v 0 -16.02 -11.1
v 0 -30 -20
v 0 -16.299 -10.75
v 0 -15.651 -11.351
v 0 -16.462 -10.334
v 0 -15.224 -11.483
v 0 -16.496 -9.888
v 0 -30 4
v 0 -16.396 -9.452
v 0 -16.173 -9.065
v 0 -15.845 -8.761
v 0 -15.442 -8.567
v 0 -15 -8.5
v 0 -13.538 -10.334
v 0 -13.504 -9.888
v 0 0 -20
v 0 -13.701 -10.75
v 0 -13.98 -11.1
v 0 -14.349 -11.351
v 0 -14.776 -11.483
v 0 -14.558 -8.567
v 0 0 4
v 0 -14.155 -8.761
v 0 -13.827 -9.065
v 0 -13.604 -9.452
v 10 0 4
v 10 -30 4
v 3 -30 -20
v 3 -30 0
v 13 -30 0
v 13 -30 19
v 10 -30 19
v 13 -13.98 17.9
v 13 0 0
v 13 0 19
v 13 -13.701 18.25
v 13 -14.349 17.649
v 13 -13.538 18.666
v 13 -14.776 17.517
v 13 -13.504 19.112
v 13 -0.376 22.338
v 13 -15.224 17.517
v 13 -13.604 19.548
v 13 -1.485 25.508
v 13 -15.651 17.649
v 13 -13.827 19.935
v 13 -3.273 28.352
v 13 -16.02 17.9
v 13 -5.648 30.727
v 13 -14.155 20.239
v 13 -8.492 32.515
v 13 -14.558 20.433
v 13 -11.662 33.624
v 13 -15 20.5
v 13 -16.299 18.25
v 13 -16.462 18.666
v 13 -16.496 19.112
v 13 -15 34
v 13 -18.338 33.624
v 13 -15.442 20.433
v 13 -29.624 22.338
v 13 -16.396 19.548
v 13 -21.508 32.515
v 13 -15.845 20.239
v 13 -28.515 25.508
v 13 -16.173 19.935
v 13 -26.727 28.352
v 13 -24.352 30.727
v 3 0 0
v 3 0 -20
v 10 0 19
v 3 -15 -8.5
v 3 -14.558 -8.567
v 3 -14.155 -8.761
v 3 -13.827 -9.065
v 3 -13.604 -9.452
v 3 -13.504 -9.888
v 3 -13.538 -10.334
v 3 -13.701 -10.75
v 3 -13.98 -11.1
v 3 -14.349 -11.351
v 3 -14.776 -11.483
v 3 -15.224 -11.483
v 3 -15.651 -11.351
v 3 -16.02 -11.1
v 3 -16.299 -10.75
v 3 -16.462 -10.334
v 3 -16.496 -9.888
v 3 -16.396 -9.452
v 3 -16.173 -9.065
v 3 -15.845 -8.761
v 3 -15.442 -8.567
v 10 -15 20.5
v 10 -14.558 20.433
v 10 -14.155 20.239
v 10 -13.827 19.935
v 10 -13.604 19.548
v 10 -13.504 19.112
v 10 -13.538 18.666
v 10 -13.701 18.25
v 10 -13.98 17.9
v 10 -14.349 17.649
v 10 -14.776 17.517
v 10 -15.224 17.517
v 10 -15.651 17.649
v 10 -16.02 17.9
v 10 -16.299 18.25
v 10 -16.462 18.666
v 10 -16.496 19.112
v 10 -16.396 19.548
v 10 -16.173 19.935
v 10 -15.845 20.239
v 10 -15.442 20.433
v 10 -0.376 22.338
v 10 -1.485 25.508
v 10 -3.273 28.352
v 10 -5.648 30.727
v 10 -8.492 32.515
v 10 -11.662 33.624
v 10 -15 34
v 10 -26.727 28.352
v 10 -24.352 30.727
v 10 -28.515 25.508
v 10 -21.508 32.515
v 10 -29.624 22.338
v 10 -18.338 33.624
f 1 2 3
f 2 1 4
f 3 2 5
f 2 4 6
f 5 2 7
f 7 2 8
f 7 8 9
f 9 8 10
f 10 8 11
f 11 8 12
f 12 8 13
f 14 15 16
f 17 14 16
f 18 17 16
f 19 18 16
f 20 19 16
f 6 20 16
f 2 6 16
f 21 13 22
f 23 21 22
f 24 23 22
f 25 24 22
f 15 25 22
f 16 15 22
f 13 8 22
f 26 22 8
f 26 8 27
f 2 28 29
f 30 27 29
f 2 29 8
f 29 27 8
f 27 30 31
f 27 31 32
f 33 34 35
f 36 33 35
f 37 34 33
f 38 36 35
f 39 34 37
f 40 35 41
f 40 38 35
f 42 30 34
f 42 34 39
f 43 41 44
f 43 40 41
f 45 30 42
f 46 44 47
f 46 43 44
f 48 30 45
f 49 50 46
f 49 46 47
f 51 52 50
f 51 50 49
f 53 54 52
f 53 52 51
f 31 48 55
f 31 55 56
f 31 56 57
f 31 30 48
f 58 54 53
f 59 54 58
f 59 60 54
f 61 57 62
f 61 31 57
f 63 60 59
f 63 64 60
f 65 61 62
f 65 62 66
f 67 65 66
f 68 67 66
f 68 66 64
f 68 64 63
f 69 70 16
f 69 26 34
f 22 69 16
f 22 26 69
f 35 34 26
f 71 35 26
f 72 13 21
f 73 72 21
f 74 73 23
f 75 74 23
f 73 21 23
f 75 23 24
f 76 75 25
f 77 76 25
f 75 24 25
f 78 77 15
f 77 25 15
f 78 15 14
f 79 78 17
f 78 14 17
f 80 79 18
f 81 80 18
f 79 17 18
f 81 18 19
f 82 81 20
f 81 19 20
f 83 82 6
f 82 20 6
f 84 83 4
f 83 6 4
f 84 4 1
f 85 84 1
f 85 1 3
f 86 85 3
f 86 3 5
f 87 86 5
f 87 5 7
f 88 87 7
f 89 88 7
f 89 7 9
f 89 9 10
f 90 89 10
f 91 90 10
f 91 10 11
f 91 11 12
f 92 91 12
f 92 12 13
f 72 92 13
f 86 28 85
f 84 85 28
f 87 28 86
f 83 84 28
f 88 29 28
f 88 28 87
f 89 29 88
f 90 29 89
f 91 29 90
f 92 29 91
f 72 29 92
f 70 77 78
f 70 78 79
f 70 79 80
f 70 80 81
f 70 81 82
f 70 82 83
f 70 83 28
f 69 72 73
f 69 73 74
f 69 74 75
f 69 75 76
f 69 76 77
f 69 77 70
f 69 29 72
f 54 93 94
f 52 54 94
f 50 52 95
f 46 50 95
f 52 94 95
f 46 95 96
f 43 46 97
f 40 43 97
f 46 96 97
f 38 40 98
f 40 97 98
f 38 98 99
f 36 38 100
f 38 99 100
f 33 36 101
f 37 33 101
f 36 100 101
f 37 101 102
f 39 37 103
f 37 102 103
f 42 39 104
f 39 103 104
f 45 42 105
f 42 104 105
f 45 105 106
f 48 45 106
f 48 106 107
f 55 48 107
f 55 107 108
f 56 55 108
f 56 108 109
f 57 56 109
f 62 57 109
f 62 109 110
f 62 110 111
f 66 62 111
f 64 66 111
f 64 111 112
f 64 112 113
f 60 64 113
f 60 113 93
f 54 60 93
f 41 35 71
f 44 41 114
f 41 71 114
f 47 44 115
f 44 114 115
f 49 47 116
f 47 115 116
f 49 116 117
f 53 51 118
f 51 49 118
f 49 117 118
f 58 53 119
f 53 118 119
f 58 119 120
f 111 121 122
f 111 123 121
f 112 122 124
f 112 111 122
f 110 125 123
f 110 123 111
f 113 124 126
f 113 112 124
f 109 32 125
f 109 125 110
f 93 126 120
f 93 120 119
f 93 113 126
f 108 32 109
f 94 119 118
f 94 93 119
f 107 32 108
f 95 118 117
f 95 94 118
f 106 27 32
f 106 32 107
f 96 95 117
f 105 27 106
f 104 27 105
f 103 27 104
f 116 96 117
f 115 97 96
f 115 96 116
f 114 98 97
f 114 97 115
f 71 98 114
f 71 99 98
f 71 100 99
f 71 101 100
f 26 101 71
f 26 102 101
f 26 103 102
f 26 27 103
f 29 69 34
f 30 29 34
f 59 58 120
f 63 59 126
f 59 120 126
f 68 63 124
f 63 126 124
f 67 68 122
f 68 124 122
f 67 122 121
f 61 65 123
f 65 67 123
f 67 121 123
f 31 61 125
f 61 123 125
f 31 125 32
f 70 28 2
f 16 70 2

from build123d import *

# Parameters (mm, degrees)
SKETCH_1_W          = 81
SKETCH_1_H          = 30
EXTRUDE_1_DEPTH     = 4
SKETCH_2_W          = 3
SKETCH_2_H          = 30
EXTRUDE_2_DEPTH     = 20
CUT_EXTRUDE_1_REACH = 90.662
SKETCH_3_R          = 1.5
SKETCH_4_W          = 3
SKETCH_4_H          = 30
EXTRUDE_3_DEPTH     = 30
CUT_EXTRUDE_2_REACH = 86.244
CUT_EXTRUDE_3_REACH = 86.244
SKETCH_8_R          = 1.5
SKETCH_9_W          = 68
SKETCH_9_H          = 54
CUT_EXTRUDE_4_DEPTH = 30


with BuildPart() as part:
    # 草图1 → 凸台-拉伸1 (new body)
    with BuildSketch(Plane.XY):
        with Locations((40.5, -15)):
            Rectangle(SKETCH_1_W, SKETCH_1_H)
    extrude(amount=EXTRUDE_1_DEPTH)

    # 草图2 → 凸台-拉伸2 (add)
    with BuildSketch(Plane(origin=(0, 0, 0), x_dir=(-1, 0, 0), z_dir=(0, 0, -1))):
        with Locations((-1.5, -15)):
            Rectangle(SKETCH_2_W, SKETCH_2_H)
        with Locations((-79.5, -15)):
            Rectangle(SKETCH_2_W, SKETCH_2_H)
    extrude(amount=EXTRUDE_2_DEPTH)

    # 切除-拉伸1: up to this face of the body (flat: up to its plane)
    cut_extrude_1_end = Plane(part.part.faces().sort_by_distance((81, -15, -8))[0])
    # 草图3 → 切除-拉伸1 (cut, up to the picked face)
    with BuildSketch(Plane.ZY, mode=Mode.PRIVATE) as cut_extrude_1_sk1:
        with Locations((-10, -15)):
            Circle(SKETCH_3_R)
    cut_extrude_1_tool1 = split(extrude(cut_extrude_1_sk1.sketch, amount=-CUT_EXTRUDE_1_REACH, mode=Mode.PRIVATE), bisect_by=cut_extrude_1_end, keep=Keep.BOTH, mode=Mode.PRIVATE)
    add(cut_extrude_1_tool1.solids().sort_by(Axis((0, -15, -10), (1, 0, 0)))[0], mode=Mode.SUBTRACT)

    # 草图4 → 凸台-拉伸3 (add)
    with BuildSketch(Plane.XY.offset(4)):
        with Locations((11.5, -15)):
            Rectangle(SKETCH_4_W, SKETCH_4_H)
        with Locations((69.5, -15)):
            Rectangle(SKETCH_4_W, SKETCH_4_H)
    extrude(amount=EXTRUDE_3_DEPTH)

    # 切除-拉伸2: up to this face of the body (flat: up to its plane)
    cut_extrude_2_end = Plane(part.part.faces().sort_by_distance((71, -15, 19))[0])
    # 草图7 → 切除-拉伸2 (cut, up to the picked face)
    with BuildSketch(Plane.ZY.offset(-10), mode=Mode.PRIVATE) as cut_extrude_2_sk1:
        with BuildLine():
            Line((34, 0), (19, 0))
            ThreePointArc((19, 0), (29.606601718, -4.393398282), (34, -15))
            Line((34, -15), (34, 0))
        make_face()
    cut_extrude_2_tool1 = split(extrude(cut_extrude_2_sk1.sketch, amount=-CUT_EXTRUDE_2_REACH, mode=Mode.PRIVATE), bisect_by=cut_extrude_2_end, keep=Keep.BOTH, mode=Mode.PRIVATE)
    # 草图7 → 切除-拉伸2 (cut, up to the picked face)
    with BuildSketch(Plane.ZY.offset(-10), mode=Mode.PRIVATE) as cut_extrude_2_sk2:
        with BuildLine():
            ThreePointArc((34, -15), (29.606601718, -25.606601718), (19, -30))
            Line((19, -30), (34, -30))
            Line((34, -30), (34, -15))
        make_face()
    cut_extrude_2_tool2 = split(extrude(cut_extrude_2_sk2.sketch, amount=-CUT_EXTRUDE_2_REACH, mode=Mode.PRIVATE), bisect_by=cut_extrude_2_end, keep=Keep.BOTH, mode=Mode.PRIVATE)
    add(cut_extrude_2_tool1.solids().sort_by(Axis((10, -3.350519, 30.649481), (1, 0, 0)))[0], mode=Mode.SUBTRACT)
    add(cut_extrude_2_tool2.solids().sort_by(Axis((10, -26.649481, 30.649481), (1, 0, 0)))[0], mode=Mode.SUBTRACT)

    # 切除-拉伸3: up to this face of the body (flat: up to its plane)
    cut_extrude_3_end = Plane(part.part.faces().sort_by_distance((71, -15, 17.599752116))[0])
    # 草图8 → 切除-拉伸3 (cut, up to the picked face)
    with BuildSketch(Plane.ZY.offset(-10), mode=Mode.PRIVATE) as cut_extrude_3_sk1:
        with Locations((19, -15)):
            Circle(SKETCH_8_R)
    cut_extrude_3_tool1 = split(extrude(cut_extrude_3_sk1.sketch, amount=-CUT_EXTRUDE_3_REACH, mode=Mode.PRIVATE), bisect_by=cut_extrude_3_end, keep=Keep.BOTH, mode=Mode.PRIVATE)
    add(cut_extrude_3_tool1.solids().sort_by(Axis((10, -15, 19), (1, 0, 0)))[0], mode=Mode.SUBTRACT)

    # 草图9 → 切除-拉伸4 (cut)
    with BuildSketch(Plane.XZ.offset(30)):
        with Locations((47, 7)):
            Rectangle(SKETCH_9_W, SKETCH_9_H)
    extrude(amount=-CUT_EXTRUDE_4_DEPTH, mode=Mode.SUBTRACT)


solid = part.part
